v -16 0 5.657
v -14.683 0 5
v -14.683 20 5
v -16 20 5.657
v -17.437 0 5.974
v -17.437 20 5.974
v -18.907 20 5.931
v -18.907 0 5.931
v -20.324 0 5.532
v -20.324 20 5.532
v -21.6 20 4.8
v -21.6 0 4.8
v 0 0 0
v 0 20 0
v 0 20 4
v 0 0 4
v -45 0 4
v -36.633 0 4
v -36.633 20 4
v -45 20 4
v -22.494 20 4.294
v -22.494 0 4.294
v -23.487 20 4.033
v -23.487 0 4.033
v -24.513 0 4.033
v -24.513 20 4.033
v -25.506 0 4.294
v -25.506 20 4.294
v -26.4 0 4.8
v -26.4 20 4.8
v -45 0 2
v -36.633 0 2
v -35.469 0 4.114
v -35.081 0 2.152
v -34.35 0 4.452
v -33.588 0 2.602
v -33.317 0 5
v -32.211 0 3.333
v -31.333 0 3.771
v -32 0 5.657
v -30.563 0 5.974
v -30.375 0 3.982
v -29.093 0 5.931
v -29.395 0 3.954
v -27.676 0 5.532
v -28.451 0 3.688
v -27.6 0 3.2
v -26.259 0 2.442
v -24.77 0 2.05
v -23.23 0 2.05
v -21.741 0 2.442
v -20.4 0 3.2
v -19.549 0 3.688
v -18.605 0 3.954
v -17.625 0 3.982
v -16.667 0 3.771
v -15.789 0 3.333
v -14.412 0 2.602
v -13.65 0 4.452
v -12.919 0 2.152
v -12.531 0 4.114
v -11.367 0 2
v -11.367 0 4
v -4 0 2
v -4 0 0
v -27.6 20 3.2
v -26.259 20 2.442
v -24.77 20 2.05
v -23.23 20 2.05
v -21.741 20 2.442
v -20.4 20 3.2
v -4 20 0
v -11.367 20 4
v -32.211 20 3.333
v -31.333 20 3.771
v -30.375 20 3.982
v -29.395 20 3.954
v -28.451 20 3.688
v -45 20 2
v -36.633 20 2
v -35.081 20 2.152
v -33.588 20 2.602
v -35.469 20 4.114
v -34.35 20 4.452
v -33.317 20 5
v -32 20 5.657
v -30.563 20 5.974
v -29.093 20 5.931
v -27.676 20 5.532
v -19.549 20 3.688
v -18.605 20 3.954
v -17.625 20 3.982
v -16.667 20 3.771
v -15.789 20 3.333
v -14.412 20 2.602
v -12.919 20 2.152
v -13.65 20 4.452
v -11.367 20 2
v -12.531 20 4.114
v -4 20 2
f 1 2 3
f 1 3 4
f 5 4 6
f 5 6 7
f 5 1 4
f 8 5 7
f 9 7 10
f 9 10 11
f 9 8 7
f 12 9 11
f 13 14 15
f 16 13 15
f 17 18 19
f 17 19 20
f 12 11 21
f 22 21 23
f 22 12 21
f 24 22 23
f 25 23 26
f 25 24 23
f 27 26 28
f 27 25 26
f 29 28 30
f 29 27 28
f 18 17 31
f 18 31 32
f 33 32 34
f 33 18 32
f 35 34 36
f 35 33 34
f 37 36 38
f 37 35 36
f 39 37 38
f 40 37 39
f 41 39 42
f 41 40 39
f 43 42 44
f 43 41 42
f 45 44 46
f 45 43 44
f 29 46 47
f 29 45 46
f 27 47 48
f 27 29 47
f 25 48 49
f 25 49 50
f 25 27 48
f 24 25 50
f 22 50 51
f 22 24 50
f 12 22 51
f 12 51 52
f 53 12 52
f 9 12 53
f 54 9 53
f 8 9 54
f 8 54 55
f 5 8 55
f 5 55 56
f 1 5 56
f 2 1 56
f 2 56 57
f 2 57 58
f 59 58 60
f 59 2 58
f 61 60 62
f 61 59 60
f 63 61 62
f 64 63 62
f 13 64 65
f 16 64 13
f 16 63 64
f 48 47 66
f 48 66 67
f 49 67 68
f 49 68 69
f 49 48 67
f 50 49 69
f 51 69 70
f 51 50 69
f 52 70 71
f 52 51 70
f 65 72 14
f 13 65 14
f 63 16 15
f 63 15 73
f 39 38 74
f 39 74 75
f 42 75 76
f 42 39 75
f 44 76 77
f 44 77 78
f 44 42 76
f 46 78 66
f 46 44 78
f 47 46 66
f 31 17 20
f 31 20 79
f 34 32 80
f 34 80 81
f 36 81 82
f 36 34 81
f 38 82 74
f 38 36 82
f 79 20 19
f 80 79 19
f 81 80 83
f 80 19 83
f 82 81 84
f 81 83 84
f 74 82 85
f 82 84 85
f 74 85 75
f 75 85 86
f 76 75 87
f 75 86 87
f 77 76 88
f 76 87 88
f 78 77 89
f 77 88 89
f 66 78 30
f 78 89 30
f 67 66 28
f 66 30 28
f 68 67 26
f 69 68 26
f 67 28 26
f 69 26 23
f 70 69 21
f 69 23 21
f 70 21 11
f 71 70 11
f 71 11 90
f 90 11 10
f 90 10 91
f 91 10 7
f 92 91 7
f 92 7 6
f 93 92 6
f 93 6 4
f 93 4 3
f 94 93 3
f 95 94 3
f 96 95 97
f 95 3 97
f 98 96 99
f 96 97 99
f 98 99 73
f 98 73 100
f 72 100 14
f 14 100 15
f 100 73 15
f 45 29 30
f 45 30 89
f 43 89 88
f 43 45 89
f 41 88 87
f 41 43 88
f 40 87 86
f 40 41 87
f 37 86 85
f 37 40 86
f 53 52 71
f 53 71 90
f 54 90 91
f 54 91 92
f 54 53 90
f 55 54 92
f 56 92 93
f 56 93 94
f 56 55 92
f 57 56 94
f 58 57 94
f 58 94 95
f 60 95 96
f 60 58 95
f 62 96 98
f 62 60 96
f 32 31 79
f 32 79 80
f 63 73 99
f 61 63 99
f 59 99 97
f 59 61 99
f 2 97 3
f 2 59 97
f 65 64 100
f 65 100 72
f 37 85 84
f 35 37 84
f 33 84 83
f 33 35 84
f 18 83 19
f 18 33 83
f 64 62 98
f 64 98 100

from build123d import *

# Parameters (mm, degrees)
F1_DEPTH = 20


with BuildPart() as f1:
    # F0 (on Front) → F1 (new body)
    with BuildSketch(Plane.XZ):
        with BuildLine():
            ThreePointArc((-21.6, 4.8), (-24, 4), (-26.4, 4.8))
            ThreePointArc((-26.4, 4.8), (-29.826577, 5.997493), (-33.316625, 5))
            ThreePointArc((-33.316625, 5), (-34.901199, 4.255437), (-36.63325, 4))
            Line((-36.63325, 4), (-45, 4))
            Line((-45, 4), (-45, 2))
            Line((-45, 2), (-36.63325, 2))
            ThreePointArc((-36.63325, 2), (-34.323849, 2.340583), (-32.211083, 3.333333))
            ThreePointArc((-32.211083, 3.333333), (-29.884385, 3.998329), (-27.6, 3.2))
            ThreePointArc((-27.6, 3.2), (-24, 2), (-20.4, 3.2))
            ThreePointArc((-20.4, 3.2), (-18.115615, 3.998329), (-15.788917, 3.333333))
            ThreePointArc((-15.788917, 3.333333), (-13.676151, 2.340583), (-11.36675, 2))
            Line((-11.36675, 2), (-4, 2))
            Line((-4, 2), (-4, 0))
            Line((-4, 0), (0, 0))
            Line((0, 0), (0, 4))
            Line((0, 4), (-11.36675, 4))
            ThreePointArc((-11.36675, 4), (-13.098801, 4.255437), (-14.683375, 5))
            ThreePointArc((-14.683375, 5), (-18.173423, 5.997493), (-21.6, 4.8))
        make_face()
    extrude(amount=-F1_DEPTH)


solid = f1.part
